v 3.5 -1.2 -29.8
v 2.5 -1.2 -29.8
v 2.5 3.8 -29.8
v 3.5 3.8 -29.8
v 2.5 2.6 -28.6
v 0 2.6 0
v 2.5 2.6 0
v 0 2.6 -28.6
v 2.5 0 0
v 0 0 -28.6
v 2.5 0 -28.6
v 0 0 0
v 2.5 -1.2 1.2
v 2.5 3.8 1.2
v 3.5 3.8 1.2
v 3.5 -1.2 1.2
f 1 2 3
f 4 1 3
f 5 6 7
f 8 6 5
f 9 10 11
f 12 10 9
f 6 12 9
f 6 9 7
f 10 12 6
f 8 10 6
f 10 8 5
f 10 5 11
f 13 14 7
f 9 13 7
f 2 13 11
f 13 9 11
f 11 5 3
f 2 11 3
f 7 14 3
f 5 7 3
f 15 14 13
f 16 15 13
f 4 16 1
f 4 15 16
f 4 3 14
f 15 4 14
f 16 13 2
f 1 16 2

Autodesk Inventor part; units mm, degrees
ref_plane "YZ Plane" through (0, 0, 0) normal (1, 0, 0) x (0, 1, 0)
ref_plane "XZ Plane" through (0, 0, 0) normal (0, 1, 0) x (-1, 0, 0)
ref_plane "XY Plane" through (0, 0, 0) normal (0, 0, 1) x (1, 0, 0)
sketch "Náčrt1" plane through (0, 0, 0) normal (1, 0, 0) x (0, 1, 0)
  line L0 (0, 0) -> (2.6, 0)
  line L1 (2.6, 0) -> (2.6, -28.6)
  line L2 (2.6, -28.6) -> (0, -28.6)
  line L3 (0, -28.6) -> (0, 0)
  dimension "d0" = 2.6
  dimension "d1" = 28.6
extrude "Vysunutí1" add sketch "Náčrt1" along normal blind 2.5
sketch "Náčrt2" plane through (2.5, 0, 0) normal (1, 0, 0) x (0, 0, -1)
  line L0 (-1.2, -1.2) -> (29.8, -1.2)
  line L1 (29.8, -1.2) -> (29.8, 3.8)
  line L2 (29.8, 3.8) -> (-1.2, 3.8)
  line L3 (-1.2, 3.8) -> (-1.2, -1.2)
  line L4 (-1.2, -1.2) -> (29.8, 3.8) construction
  line L5 (29.8, -1.2) -> (-1.2, 3.8) construction
  line L6 (28.6, 2.6) -> (0, 2.6) projected
  point P0 (0, 0)
  point P1 (14.3, 1.3)
  dimension "d4" = 31
  dimension "d5" = 5
  dimension "d6" = 1.2
extrude "Vysunutí2" add sketch "Náčrt2" along normal blind 1
properties part number "CardCover"
